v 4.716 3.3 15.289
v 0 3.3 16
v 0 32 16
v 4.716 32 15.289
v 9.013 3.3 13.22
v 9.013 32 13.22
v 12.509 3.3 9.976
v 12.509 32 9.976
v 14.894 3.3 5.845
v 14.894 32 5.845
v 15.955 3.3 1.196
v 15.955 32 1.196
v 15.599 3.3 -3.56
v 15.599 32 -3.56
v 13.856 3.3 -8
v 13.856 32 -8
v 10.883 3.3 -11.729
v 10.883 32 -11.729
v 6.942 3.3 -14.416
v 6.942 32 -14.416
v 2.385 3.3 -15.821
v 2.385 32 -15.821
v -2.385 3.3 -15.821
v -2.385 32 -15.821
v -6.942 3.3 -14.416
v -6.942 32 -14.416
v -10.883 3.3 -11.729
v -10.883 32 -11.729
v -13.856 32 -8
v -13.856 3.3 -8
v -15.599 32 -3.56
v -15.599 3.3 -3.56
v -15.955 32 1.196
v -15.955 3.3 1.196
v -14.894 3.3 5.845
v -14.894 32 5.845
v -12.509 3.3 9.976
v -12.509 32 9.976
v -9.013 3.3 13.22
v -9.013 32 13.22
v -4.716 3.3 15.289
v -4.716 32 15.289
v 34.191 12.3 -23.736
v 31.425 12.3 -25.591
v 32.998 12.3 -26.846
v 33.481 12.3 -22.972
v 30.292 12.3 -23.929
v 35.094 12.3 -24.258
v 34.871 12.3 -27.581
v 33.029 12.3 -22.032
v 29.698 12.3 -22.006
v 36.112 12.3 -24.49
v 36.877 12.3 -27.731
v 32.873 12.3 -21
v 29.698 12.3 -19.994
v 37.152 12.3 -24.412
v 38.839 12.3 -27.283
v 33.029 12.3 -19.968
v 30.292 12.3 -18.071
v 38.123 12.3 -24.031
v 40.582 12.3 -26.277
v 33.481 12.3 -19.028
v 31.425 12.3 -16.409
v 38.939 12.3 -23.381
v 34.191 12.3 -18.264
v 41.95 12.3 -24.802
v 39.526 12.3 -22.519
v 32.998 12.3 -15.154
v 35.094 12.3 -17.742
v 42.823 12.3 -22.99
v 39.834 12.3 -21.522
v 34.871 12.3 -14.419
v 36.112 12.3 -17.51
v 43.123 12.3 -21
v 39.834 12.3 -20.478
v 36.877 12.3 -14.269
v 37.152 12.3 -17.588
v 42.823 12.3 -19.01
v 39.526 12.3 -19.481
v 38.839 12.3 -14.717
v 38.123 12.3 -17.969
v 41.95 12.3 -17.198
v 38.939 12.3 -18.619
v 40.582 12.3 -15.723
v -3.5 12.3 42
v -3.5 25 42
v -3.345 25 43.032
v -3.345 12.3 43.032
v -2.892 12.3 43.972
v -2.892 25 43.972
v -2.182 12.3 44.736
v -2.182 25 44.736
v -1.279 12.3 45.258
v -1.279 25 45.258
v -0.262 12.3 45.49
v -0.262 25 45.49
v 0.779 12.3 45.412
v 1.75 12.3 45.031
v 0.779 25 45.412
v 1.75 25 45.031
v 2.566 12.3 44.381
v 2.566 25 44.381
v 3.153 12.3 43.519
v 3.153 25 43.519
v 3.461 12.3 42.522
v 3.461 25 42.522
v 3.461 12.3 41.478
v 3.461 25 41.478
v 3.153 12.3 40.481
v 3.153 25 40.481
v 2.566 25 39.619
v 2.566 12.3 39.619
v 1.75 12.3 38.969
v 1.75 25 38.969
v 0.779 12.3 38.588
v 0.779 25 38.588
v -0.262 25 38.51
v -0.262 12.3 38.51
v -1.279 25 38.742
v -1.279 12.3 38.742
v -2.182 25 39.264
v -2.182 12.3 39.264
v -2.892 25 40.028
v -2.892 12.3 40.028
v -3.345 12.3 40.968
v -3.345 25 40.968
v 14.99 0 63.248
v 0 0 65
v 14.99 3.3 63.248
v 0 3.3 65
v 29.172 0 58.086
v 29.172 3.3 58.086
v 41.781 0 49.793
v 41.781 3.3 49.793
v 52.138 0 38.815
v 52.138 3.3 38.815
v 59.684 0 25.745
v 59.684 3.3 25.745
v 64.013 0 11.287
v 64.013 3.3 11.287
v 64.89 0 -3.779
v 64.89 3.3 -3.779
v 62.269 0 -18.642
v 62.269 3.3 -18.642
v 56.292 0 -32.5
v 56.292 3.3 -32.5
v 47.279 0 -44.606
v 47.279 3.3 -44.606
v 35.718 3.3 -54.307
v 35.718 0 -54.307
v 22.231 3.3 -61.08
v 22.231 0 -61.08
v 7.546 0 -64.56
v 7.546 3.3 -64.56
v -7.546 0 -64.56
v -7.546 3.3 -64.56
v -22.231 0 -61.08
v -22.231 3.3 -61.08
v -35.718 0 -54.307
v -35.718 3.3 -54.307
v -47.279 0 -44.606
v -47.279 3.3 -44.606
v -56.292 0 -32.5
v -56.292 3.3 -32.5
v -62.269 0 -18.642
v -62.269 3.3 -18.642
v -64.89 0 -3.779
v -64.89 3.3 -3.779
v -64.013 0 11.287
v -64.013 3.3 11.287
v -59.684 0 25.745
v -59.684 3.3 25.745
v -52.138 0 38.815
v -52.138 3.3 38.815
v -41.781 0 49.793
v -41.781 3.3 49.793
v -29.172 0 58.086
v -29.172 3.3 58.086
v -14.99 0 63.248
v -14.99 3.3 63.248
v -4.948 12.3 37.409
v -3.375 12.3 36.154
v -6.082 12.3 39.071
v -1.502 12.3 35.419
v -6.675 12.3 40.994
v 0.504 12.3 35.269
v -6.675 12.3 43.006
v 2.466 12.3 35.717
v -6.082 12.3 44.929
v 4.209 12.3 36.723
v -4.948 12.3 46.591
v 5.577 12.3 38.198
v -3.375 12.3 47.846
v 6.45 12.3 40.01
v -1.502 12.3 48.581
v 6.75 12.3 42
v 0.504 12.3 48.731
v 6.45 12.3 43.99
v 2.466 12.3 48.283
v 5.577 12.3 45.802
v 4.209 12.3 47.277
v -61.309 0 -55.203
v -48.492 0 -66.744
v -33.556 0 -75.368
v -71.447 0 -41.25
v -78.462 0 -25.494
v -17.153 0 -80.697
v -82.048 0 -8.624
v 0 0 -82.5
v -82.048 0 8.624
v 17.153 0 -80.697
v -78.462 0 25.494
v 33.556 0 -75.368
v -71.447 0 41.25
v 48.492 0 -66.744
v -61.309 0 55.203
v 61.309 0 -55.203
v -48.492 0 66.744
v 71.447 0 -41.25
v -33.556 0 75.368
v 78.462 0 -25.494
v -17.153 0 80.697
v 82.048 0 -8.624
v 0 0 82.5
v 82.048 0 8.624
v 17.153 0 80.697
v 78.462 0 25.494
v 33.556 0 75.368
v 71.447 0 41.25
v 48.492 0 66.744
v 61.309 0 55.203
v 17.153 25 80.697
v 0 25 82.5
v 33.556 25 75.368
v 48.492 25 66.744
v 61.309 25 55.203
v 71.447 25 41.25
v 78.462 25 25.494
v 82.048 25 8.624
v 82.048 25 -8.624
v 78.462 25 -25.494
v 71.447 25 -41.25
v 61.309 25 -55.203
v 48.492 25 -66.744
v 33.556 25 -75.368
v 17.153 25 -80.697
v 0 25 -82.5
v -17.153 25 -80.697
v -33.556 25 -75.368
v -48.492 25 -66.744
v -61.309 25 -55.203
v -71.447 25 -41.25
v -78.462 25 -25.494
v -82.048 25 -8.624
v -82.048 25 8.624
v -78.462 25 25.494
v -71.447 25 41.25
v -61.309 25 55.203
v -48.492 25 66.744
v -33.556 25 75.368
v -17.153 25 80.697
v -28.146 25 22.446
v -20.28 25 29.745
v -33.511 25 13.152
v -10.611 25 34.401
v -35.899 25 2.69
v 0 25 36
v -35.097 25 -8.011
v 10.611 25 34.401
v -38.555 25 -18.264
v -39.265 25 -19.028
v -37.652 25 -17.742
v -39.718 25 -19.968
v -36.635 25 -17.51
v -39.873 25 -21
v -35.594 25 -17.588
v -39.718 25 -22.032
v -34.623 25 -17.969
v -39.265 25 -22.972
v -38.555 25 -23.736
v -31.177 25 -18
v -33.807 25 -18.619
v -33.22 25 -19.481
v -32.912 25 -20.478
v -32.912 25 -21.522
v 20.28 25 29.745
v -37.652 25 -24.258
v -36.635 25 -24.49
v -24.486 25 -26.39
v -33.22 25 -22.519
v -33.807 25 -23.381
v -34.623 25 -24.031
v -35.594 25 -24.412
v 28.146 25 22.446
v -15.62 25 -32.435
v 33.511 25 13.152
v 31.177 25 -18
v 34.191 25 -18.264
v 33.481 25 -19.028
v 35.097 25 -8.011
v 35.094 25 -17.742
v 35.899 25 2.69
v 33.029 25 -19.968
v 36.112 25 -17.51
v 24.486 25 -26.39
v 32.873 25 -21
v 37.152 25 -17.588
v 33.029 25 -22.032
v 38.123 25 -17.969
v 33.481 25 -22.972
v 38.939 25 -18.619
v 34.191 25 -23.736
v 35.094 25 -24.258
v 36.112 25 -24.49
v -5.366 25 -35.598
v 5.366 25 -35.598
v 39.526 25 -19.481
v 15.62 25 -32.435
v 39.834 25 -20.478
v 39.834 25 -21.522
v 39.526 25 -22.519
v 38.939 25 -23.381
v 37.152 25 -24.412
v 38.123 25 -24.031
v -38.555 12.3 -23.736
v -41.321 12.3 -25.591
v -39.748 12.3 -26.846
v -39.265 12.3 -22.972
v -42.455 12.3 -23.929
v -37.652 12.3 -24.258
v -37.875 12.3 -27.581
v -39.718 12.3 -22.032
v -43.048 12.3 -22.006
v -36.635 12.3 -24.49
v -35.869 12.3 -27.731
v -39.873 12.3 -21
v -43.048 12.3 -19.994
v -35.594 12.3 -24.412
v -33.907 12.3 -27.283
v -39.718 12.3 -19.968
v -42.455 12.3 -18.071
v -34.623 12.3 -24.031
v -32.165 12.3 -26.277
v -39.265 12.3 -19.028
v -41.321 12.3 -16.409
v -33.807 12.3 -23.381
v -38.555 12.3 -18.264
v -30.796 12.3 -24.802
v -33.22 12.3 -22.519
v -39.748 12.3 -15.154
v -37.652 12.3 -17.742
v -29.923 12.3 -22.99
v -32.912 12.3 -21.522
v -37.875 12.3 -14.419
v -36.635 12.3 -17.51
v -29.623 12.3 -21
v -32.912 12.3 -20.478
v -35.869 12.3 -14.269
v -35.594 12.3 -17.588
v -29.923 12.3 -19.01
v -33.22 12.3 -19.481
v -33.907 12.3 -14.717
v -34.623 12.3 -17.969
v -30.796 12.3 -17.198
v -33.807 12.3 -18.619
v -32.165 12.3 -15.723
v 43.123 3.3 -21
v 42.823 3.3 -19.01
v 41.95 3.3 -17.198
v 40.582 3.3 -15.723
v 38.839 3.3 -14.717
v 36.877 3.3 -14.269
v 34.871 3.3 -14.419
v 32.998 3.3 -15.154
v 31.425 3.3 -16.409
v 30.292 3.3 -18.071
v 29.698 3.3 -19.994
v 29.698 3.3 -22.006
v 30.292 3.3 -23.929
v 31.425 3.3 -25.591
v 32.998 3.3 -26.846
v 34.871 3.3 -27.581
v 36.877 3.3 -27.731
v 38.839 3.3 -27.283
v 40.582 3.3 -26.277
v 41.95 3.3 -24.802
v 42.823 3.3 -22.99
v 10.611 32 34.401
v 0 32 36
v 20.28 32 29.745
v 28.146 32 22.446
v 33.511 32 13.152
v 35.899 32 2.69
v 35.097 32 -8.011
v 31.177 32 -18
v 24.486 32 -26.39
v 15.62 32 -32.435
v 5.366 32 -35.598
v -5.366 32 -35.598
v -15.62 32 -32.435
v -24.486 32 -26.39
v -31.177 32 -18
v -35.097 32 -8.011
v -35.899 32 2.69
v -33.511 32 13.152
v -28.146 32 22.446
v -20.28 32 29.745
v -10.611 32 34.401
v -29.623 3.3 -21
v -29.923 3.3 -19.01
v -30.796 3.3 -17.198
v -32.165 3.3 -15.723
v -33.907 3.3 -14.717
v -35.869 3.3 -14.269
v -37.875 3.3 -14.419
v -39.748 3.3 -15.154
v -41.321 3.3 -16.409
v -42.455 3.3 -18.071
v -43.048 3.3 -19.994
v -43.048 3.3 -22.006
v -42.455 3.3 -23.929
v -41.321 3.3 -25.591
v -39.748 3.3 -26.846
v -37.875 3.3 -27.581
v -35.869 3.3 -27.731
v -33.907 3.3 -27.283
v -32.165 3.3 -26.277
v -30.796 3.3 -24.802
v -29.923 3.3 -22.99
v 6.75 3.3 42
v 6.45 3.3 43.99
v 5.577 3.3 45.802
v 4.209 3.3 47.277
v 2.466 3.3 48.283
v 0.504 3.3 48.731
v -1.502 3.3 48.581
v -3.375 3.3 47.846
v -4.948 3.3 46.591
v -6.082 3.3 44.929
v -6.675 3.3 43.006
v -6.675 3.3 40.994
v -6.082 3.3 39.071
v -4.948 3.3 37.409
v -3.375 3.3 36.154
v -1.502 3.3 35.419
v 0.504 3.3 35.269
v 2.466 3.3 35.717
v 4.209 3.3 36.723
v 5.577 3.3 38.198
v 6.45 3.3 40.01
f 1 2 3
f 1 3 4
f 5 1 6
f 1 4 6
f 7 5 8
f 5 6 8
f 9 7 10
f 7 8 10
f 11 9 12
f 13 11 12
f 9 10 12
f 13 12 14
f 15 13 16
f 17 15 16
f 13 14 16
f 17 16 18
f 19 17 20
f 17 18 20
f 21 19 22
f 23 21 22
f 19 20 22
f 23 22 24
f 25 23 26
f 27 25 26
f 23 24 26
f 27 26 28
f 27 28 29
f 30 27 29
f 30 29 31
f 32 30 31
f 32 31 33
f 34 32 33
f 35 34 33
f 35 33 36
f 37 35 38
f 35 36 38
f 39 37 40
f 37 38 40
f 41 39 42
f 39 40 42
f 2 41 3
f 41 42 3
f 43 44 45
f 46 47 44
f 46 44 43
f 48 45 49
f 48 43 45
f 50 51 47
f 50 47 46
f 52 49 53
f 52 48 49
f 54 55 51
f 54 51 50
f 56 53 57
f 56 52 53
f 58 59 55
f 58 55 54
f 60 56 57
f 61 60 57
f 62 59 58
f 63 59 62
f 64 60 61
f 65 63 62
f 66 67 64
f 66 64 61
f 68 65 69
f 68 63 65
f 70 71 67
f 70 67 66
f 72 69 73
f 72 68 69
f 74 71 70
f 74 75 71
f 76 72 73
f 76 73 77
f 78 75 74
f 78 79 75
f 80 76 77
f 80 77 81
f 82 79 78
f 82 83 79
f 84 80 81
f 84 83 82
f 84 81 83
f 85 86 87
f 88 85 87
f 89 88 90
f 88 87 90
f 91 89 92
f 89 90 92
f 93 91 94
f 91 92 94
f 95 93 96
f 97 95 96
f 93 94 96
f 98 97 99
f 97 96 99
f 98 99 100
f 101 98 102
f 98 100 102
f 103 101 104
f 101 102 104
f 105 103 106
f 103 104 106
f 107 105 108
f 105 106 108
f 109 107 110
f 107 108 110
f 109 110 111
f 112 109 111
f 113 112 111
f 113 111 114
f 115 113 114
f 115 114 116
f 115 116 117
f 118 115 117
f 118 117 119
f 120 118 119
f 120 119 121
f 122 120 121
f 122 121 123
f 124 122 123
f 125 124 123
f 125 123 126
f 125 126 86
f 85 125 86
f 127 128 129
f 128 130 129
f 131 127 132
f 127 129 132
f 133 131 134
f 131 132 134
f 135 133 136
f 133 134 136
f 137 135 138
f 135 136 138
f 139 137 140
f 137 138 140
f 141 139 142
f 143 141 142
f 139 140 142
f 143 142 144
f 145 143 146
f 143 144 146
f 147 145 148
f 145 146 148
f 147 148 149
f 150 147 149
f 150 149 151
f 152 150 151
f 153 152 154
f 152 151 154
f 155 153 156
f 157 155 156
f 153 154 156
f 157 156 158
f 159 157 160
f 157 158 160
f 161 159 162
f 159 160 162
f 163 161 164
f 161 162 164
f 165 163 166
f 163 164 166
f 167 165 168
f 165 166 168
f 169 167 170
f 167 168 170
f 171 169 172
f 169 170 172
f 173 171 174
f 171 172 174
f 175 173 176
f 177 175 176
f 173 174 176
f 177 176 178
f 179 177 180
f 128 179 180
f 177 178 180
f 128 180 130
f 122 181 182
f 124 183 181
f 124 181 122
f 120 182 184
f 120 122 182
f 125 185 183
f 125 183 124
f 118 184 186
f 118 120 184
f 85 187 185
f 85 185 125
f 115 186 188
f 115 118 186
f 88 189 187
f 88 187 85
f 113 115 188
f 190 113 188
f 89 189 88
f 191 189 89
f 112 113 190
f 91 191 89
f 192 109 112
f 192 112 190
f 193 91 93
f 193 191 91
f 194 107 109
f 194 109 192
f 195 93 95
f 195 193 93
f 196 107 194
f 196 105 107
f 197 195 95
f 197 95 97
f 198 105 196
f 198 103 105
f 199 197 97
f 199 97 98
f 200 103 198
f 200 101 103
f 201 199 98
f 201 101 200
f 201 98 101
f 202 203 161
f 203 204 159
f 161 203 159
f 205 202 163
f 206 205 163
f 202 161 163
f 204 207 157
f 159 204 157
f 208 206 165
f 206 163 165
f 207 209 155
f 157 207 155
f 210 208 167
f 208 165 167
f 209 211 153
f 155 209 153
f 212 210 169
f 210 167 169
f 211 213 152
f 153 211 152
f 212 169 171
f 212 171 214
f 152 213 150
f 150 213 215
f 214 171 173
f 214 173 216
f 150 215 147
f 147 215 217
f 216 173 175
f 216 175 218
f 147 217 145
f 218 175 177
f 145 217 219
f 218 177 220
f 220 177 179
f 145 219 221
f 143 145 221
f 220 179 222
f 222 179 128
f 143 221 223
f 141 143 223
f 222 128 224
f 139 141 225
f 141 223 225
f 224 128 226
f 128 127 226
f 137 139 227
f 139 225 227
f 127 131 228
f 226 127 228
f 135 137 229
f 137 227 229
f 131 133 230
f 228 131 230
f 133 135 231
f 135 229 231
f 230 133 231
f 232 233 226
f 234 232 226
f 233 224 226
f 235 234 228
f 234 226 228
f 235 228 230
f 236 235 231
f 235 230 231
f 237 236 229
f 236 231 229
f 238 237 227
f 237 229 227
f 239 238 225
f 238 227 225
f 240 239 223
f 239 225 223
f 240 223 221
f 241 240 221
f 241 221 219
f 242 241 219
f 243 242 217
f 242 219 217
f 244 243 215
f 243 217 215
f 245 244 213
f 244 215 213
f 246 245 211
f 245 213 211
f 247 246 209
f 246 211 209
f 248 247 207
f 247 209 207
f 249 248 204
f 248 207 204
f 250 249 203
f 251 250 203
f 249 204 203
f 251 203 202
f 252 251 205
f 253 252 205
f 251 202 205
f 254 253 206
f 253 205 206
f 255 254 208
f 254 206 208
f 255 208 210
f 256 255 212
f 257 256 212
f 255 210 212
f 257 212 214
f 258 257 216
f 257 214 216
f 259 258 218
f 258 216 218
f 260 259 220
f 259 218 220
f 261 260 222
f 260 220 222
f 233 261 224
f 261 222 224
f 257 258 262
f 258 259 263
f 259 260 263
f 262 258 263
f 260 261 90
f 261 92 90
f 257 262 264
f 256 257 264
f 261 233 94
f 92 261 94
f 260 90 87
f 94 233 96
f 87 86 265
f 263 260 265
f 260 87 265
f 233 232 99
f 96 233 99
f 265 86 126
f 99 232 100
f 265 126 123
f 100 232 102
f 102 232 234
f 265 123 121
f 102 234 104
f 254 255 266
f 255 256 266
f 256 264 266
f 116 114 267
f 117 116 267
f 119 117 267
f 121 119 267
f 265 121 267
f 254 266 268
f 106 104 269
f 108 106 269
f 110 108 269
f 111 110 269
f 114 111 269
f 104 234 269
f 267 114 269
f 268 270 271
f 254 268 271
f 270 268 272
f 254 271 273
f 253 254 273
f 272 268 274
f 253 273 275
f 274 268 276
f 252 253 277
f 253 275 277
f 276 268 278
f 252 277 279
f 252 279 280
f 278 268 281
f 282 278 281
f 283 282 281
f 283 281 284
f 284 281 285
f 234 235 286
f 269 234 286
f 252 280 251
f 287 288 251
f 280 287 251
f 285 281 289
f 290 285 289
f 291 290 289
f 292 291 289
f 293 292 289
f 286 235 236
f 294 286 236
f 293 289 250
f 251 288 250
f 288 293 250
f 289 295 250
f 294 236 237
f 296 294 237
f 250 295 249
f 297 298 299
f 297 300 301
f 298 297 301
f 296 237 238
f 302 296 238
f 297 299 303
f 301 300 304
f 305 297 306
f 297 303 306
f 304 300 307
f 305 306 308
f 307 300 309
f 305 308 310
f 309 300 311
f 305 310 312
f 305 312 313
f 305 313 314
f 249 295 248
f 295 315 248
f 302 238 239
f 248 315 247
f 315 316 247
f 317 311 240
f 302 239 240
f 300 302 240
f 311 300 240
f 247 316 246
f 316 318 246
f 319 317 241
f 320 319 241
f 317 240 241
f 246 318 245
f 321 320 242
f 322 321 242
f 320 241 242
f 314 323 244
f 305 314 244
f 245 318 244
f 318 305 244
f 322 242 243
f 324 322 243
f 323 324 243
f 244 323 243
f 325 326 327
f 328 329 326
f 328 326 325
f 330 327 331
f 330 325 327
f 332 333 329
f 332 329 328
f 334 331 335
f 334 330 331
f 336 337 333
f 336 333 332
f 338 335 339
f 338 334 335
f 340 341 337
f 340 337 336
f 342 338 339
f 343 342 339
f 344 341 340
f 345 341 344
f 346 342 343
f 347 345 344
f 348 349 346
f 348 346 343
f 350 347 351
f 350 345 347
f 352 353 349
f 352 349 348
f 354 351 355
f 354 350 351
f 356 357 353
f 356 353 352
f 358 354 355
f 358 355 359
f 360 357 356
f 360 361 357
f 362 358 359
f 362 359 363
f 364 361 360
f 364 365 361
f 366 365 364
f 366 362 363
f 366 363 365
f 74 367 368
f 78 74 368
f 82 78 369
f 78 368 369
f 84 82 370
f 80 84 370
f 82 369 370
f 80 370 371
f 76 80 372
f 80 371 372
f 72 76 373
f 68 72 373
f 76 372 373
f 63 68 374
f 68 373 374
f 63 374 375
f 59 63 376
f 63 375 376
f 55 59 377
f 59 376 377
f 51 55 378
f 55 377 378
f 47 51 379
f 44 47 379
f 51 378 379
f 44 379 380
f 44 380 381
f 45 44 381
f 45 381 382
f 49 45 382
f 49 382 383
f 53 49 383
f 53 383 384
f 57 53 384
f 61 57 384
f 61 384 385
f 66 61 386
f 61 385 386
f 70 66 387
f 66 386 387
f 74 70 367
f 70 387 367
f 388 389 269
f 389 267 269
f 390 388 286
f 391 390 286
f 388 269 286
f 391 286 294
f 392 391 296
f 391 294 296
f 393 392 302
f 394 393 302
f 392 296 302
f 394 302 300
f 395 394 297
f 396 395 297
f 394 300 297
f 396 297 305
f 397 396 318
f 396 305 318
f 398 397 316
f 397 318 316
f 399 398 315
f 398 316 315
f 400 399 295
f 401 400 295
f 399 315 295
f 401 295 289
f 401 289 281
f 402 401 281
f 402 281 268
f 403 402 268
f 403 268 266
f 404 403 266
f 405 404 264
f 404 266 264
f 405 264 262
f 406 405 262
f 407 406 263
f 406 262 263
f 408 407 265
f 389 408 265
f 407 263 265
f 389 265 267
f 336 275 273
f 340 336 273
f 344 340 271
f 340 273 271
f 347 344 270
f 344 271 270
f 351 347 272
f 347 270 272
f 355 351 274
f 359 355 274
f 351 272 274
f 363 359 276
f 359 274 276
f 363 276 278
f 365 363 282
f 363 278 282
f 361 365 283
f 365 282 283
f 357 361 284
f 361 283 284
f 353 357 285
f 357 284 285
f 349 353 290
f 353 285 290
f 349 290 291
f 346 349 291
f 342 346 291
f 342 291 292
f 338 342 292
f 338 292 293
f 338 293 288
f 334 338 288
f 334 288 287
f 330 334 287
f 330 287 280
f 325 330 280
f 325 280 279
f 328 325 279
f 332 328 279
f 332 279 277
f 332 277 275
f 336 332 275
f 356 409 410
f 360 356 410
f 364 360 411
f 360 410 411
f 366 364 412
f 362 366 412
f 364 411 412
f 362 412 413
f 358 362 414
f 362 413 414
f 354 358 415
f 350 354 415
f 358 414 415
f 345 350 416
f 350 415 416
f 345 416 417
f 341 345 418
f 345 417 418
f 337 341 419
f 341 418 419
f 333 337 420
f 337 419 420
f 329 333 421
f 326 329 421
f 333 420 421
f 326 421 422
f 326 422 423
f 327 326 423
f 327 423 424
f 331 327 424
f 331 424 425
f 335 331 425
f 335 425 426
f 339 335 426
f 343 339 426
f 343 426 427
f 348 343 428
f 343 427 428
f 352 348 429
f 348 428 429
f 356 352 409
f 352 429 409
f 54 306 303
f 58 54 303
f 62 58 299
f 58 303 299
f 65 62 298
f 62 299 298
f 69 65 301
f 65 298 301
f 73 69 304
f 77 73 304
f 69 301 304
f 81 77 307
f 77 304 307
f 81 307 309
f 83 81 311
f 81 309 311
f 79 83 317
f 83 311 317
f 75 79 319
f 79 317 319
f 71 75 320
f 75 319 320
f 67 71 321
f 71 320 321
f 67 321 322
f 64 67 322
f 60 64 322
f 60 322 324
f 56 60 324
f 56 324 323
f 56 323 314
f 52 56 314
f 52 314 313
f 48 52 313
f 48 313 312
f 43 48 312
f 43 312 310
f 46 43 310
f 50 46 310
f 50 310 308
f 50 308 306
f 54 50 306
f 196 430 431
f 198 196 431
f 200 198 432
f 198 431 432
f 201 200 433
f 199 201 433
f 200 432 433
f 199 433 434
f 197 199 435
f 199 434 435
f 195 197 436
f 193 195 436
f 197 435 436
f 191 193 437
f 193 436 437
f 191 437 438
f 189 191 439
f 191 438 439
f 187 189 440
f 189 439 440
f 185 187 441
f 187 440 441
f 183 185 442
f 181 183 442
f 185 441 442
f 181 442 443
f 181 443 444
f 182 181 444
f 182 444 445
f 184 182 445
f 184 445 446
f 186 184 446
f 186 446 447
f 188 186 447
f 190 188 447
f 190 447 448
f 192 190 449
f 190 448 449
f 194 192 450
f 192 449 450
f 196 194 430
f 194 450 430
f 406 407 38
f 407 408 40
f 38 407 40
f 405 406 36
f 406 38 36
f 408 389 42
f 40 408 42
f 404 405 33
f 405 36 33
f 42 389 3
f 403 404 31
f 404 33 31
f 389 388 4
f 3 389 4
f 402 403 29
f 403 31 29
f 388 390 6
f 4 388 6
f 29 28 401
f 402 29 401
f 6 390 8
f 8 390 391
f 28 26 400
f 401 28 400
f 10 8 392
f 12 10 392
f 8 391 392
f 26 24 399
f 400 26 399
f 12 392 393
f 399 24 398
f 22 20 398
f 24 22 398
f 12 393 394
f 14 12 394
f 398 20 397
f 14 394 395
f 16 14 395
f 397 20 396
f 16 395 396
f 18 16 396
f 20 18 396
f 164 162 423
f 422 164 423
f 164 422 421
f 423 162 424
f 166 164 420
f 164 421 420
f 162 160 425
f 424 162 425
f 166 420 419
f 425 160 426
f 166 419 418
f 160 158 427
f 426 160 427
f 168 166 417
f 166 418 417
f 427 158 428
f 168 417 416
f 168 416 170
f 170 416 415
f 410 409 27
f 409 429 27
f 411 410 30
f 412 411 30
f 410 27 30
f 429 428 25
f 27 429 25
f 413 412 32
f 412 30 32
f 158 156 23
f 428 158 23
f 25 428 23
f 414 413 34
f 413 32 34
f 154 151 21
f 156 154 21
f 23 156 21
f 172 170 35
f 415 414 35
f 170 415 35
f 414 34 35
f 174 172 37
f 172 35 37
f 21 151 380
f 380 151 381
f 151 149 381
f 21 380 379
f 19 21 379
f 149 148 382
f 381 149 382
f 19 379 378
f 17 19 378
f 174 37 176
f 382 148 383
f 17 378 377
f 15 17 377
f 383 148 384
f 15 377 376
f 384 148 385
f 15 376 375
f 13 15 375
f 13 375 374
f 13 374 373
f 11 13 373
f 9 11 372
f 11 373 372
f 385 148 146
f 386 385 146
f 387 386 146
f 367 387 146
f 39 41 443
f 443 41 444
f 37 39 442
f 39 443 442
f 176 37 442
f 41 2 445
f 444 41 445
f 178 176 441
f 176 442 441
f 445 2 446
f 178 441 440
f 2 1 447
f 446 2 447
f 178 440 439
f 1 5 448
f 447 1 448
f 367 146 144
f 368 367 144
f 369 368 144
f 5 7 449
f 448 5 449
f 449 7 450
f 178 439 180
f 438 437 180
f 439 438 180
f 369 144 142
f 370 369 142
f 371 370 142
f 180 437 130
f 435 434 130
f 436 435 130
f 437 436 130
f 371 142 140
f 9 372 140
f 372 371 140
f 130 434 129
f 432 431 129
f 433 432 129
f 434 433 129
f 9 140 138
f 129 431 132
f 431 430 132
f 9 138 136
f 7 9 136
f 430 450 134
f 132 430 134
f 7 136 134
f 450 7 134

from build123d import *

# Parameters (mm, degrees)
F2_R     = 6.75
F3_DEPTH = 9
F4_R     = 3.5
F5_DEPTH = 25.001


with BuildPart() as f1:
    # F0 (on Right) → F1 (revolve)
    with BuildSketch(Plane.YZ):
        Polygon((3.3, 16), (32, 16), (32, 36), (25, 36), (25, 82.5), (0, 82.5), (0, 65), (3.3, 65), align=None)
    revolve(axis=Axis((0, 21.725982, 0), (0, 1, 0)))

    # F2 (on face) → F3 (cut)
    with BuildSketch(Plane.XZ.offset(-3.3)):
        with Locations((0, 42)):
            Circle(F2_R)
        with Locations((36.373067, -21)):
            Circle(F2_R)
        with Locations((-36.373067, -21)):
            Circle(F2_R)
    extrude(amount=-F3_DEPTH, mode=Mode.SUBTRACT)

    # F4 (on face) → F5 (cut, through all)
    with BuildSketch(Plane(origin=(0, 25, 0), x_dir=(-1, 0, 0), z_dir=(0, 1, 0))):
        with Locations((0, 42)):
            Circle(F4_R)
        with Locations((-36.373067, -21)):
            Circle(F4_R)
        with Locations((36.373067, -21)):
            Circle(F4_R)
    extrude(amount=-F5_DEPTH, mode=Mode.SUBTRACT)


solid = f1.part
